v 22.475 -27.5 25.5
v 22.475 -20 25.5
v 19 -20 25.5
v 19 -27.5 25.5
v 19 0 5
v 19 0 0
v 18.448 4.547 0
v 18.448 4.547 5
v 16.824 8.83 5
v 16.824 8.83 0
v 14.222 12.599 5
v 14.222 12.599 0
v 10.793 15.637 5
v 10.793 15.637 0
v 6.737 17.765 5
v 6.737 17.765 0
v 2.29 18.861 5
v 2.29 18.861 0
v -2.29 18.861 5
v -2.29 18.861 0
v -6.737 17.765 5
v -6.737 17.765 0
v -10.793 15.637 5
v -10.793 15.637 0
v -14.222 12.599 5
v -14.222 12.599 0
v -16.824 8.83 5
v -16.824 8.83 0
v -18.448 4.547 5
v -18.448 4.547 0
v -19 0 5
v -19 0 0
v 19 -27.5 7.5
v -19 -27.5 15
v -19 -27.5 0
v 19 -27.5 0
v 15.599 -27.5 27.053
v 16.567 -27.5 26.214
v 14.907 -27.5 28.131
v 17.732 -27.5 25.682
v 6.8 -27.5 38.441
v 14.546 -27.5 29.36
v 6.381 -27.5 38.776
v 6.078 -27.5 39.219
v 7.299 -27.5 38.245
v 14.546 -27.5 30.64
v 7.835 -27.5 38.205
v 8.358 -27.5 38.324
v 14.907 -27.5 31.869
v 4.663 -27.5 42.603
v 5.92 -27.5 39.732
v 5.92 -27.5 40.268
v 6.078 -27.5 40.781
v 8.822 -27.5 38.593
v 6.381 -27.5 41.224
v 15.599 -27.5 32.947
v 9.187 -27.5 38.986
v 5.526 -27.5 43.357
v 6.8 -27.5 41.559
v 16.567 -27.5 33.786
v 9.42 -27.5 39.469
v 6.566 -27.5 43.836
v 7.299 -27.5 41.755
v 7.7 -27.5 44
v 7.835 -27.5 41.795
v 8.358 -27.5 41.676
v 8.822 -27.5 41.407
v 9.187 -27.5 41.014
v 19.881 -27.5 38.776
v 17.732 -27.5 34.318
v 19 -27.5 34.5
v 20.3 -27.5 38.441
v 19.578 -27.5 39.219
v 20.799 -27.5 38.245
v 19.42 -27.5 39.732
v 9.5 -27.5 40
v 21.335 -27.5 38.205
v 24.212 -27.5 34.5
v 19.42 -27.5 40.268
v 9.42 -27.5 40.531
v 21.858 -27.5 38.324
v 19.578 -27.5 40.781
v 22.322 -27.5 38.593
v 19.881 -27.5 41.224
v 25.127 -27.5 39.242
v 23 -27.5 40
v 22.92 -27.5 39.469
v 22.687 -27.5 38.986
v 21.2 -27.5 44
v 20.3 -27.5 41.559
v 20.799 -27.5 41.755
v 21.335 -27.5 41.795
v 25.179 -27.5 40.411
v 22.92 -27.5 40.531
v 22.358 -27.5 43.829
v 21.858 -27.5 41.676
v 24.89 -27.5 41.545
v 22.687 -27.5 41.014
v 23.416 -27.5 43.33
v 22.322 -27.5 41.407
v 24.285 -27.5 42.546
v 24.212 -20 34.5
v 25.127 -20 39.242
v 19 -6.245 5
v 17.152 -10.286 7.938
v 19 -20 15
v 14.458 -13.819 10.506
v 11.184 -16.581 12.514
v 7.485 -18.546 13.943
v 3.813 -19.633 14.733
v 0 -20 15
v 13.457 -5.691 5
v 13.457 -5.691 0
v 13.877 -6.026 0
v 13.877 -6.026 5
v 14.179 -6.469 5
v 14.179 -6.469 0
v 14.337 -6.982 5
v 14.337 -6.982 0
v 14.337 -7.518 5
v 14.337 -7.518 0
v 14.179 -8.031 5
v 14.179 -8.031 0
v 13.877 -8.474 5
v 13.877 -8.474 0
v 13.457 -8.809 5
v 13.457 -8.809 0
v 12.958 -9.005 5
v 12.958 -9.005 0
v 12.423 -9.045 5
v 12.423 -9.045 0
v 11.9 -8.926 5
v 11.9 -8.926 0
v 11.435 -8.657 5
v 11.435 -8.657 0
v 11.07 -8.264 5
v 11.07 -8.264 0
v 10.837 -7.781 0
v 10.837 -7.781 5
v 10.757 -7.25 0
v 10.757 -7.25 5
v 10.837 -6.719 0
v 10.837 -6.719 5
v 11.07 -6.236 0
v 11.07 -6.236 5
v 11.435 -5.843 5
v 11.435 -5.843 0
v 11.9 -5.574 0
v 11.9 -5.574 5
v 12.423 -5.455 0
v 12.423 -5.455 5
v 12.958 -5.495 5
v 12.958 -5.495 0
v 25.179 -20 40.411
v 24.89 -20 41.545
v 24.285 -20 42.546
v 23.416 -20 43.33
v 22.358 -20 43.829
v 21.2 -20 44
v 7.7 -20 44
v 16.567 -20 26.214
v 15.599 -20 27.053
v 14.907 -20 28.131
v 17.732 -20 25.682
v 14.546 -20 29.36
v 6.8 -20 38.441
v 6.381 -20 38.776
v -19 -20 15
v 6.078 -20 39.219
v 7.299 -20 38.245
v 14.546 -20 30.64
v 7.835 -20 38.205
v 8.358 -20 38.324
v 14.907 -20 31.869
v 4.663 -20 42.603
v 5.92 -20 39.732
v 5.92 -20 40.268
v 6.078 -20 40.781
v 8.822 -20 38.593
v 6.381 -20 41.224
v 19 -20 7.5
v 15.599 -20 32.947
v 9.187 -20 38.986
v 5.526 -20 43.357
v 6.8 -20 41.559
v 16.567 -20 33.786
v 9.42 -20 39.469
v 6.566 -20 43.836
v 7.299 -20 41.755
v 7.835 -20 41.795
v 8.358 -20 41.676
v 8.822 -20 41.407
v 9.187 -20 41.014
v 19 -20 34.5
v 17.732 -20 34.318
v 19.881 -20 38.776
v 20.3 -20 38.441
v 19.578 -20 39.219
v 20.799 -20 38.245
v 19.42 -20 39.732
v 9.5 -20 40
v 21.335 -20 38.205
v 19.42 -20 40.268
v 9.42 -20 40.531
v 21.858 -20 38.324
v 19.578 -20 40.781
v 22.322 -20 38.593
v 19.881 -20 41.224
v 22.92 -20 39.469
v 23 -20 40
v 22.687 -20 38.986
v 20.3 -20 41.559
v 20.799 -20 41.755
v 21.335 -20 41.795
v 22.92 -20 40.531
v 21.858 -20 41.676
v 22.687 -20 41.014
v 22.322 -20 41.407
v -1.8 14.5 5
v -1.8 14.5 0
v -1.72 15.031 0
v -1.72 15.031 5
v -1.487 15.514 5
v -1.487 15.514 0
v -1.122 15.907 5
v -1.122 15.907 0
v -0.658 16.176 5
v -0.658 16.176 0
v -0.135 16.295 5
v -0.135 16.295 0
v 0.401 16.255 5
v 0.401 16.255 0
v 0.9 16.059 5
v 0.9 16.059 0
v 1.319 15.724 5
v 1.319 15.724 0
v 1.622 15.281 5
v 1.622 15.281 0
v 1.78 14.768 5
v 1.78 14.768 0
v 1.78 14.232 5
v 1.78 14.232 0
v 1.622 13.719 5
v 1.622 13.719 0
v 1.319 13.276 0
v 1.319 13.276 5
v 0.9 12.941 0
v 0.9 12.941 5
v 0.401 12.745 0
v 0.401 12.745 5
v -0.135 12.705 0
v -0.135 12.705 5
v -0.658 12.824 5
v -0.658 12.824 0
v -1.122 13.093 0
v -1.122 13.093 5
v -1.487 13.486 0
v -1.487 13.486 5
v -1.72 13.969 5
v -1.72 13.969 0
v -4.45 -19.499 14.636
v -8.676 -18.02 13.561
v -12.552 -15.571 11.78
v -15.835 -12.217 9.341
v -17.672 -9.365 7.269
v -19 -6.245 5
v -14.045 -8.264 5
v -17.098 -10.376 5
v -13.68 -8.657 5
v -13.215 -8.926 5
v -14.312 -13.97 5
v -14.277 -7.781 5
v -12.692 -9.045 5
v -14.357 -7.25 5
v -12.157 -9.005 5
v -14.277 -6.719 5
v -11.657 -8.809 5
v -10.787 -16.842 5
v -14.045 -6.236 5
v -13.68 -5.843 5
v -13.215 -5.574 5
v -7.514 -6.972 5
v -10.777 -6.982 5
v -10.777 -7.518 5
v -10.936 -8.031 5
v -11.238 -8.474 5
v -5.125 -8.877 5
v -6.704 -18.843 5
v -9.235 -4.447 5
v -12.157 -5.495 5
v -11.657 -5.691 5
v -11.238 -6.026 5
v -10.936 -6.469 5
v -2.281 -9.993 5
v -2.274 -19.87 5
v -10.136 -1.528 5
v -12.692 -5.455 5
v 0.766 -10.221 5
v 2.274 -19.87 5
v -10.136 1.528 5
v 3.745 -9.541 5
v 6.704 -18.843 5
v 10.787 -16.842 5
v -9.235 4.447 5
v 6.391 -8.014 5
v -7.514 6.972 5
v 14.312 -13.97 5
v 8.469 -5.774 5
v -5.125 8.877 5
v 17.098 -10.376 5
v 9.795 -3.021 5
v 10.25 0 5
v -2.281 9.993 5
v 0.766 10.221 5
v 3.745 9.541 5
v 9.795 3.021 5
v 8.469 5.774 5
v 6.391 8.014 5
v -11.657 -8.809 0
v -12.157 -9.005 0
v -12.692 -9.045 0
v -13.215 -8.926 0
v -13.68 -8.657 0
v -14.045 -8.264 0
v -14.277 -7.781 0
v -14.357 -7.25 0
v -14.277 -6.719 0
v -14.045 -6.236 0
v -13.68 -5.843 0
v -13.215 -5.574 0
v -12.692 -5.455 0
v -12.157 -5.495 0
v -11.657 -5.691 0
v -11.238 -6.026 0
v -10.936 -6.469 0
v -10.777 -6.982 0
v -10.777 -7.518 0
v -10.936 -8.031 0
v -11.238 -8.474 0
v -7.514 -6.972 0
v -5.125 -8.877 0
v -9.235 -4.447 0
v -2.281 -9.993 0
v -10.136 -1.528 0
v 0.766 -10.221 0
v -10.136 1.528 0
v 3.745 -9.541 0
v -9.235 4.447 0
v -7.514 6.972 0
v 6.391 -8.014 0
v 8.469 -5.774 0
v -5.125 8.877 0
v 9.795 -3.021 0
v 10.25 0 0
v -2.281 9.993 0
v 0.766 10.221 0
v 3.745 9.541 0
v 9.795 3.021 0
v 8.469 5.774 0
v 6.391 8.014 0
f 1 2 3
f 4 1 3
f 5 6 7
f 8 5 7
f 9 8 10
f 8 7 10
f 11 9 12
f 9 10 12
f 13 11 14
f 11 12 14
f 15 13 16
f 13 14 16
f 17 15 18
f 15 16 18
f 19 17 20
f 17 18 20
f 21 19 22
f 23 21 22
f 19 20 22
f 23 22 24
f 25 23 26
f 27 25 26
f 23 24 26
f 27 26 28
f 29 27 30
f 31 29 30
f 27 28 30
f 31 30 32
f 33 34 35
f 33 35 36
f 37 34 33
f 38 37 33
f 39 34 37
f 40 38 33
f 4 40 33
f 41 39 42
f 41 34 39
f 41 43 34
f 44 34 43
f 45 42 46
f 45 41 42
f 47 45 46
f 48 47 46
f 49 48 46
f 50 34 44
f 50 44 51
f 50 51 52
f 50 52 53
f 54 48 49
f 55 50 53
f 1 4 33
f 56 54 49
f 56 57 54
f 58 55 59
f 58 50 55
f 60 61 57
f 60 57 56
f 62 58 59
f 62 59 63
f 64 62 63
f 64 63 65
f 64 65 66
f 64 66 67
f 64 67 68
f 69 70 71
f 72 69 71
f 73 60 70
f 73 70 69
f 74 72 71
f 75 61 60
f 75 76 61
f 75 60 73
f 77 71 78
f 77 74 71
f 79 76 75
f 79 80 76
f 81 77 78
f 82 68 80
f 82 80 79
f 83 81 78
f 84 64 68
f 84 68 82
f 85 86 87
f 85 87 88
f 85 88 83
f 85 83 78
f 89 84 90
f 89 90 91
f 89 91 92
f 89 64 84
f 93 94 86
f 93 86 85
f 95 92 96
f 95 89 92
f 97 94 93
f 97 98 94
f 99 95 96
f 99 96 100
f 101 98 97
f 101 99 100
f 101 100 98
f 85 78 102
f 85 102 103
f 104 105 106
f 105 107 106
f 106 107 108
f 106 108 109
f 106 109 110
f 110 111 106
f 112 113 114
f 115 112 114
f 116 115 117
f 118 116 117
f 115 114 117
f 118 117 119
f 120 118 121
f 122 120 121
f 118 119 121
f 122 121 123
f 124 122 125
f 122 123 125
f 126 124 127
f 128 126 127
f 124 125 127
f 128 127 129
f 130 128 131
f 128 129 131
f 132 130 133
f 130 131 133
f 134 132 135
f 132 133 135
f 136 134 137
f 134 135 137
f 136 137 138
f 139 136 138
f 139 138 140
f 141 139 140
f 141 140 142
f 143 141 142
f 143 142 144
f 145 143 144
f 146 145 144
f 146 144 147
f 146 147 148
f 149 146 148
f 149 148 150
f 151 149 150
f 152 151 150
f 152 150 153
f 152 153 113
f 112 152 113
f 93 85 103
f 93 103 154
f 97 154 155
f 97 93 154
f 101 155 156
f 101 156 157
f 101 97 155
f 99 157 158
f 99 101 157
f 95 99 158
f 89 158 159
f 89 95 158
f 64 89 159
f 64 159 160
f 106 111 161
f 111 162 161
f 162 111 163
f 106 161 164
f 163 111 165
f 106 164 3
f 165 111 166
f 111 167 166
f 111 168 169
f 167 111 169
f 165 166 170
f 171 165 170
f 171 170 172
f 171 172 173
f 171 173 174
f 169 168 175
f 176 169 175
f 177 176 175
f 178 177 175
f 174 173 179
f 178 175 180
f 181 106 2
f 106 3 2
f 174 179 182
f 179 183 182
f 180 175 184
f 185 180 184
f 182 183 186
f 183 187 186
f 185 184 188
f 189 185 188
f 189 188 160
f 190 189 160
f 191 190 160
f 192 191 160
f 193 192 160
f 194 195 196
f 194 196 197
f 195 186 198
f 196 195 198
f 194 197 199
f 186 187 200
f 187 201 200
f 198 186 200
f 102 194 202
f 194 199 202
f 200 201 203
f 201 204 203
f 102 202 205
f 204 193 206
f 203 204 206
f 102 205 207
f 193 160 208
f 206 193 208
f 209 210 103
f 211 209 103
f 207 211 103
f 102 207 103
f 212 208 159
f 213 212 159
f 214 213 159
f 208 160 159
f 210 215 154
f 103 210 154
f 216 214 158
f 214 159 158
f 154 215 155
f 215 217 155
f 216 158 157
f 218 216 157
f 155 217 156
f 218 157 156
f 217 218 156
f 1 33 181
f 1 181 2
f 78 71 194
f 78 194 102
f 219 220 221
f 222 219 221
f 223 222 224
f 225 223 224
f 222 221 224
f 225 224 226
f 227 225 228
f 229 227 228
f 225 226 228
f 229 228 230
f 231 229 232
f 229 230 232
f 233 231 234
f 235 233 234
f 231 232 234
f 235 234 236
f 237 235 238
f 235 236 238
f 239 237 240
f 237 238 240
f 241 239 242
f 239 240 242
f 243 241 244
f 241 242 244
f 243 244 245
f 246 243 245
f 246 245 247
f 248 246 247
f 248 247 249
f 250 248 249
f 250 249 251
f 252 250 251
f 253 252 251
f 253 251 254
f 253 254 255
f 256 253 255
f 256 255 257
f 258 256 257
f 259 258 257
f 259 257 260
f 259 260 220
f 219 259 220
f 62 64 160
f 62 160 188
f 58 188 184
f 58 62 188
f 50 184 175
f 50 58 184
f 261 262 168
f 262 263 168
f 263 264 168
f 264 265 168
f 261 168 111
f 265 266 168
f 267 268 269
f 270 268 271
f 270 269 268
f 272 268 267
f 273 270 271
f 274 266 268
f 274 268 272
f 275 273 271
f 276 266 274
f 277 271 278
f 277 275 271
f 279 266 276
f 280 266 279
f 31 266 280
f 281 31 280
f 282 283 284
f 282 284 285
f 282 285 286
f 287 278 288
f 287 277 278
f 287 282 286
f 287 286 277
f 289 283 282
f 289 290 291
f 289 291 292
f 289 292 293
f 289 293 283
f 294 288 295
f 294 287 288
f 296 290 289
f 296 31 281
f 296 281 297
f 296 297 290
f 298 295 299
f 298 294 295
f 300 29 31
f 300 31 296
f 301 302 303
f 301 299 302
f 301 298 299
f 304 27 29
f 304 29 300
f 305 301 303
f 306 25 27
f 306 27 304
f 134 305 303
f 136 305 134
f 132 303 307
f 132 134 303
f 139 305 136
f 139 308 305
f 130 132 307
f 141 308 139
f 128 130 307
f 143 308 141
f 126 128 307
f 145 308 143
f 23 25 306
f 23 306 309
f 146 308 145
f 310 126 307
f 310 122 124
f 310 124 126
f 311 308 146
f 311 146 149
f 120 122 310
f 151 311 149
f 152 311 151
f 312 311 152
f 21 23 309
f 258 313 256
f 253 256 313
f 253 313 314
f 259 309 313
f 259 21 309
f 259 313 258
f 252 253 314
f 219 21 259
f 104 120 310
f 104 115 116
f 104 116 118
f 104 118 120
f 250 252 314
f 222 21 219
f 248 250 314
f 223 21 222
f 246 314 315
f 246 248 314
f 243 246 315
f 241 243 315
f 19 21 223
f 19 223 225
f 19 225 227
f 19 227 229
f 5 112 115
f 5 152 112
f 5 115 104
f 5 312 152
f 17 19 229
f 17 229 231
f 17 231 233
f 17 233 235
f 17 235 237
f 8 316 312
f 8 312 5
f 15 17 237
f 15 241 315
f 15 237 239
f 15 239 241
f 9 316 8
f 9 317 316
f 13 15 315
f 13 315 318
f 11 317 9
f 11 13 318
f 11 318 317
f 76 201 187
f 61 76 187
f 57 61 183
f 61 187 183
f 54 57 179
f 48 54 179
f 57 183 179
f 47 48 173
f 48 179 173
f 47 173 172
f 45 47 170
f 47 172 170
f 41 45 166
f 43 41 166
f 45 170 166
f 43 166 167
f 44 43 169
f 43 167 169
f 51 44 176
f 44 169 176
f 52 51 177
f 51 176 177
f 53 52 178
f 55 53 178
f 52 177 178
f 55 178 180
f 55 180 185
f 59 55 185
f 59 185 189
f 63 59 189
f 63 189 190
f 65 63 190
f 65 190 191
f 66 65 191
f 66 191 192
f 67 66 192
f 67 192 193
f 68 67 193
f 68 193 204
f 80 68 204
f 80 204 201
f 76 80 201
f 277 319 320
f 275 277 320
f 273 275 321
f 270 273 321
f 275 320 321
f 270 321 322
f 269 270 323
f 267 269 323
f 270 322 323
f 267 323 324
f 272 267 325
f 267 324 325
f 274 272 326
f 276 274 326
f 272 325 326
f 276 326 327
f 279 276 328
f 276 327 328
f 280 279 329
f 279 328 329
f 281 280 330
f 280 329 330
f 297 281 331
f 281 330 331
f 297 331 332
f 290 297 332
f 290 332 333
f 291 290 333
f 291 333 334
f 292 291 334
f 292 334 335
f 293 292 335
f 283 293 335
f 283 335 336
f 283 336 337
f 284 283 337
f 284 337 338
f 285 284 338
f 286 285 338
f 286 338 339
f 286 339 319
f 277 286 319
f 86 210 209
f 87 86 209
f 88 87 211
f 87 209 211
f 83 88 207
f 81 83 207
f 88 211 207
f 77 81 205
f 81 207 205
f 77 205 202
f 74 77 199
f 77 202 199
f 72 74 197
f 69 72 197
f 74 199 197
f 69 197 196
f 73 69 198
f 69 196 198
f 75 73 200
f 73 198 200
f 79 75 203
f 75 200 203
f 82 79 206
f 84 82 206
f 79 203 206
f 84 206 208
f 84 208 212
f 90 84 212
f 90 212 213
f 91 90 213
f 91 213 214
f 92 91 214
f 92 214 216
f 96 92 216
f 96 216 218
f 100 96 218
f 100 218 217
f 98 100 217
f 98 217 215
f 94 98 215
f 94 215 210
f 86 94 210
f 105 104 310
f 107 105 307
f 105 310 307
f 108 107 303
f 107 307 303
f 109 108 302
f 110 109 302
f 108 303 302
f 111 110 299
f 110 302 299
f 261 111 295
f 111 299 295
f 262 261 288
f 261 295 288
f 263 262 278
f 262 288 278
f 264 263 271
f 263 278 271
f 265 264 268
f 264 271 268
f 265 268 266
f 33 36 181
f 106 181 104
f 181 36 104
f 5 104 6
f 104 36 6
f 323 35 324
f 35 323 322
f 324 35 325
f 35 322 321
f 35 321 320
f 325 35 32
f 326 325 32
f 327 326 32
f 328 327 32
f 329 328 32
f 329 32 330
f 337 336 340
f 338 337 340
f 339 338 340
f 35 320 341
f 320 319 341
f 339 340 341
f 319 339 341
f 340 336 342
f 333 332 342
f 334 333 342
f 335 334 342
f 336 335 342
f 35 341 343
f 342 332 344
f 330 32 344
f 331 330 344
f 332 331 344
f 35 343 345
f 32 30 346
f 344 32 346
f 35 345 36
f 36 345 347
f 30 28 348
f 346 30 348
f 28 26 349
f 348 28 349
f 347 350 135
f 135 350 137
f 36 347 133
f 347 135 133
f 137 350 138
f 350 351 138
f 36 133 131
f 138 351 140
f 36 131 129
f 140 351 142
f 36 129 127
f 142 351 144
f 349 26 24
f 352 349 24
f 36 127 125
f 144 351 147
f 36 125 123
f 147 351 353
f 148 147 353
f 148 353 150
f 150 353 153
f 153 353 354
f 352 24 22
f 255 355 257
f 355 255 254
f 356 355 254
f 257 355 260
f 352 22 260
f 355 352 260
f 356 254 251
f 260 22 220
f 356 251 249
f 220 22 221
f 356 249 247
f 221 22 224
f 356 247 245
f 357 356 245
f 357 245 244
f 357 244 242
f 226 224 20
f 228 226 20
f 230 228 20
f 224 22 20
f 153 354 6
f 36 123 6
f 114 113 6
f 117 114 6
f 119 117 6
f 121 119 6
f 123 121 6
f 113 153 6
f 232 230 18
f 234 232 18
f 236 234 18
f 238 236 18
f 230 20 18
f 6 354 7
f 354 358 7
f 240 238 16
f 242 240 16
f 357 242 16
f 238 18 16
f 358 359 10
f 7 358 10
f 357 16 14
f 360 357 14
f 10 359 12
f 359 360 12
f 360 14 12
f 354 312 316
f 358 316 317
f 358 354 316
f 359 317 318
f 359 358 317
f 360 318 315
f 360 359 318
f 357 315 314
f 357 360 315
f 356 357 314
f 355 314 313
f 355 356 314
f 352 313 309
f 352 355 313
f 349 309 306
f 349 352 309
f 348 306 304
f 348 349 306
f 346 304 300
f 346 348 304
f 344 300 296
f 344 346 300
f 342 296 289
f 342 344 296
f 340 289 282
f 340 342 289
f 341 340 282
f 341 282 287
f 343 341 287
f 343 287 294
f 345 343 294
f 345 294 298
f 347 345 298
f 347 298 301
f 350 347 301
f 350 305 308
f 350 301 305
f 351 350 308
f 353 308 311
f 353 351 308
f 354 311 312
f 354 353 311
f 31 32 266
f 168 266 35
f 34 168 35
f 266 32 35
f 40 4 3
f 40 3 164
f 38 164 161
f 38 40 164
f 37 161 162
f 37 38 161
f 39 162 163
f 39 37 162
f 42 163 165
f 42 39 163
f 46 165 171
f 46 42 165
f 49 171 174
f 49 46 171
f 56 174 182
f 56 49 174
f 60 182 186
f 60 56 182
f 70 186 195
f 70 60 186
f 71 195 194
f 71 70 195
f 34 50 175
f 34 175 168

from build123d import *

# Parameters (mm, degrees)
SKETCH1_R            = 10.25
BOSS_EXTRUDE1_DEPTH  = 5
M3_CLEARANCE_HOLE1_D = 3.6
CIRPATTERN1_COUNT    = 3
BOSS_EXTRUDE2_DEPTH  = 15
BOSS_EXTRUDE3_DEPTH  = 7.5
M3_CLEARANCE_HOLE2_D = 3.6
CUT_EXTRUDE1_DEPTH   = 45.2
CUT_EXTRUDE2_DEPTH   = 47.5


with BuildPart() as part:
    # Sketch1 → Boss-Extrude1 (new body)
    with BuildSketch(Plane.XY):
        with BuildLine():
            Line((19, -27.5), (19, 0))
            ThreePointArc((19, 0), (0, 19), (-19, 0))
            Line((-19, 0), (-19, -27.5))
            Line((-19, -27.5), (19, -27.5))
        make_face()
        Circle(SKETCH1_R, mode=Mode.SUBTRACT)
    extrude(amount=BOSS_EXTRUDE1_DEPTH)

    # M3 Clearance Hole1 (through all)
    with Locations(Plane.XY.offset(5)):
        with Locations((0, 14.5)):
            m3_clearance_hole1 = Hole(M3_CLEARANCE_HOLE1_D / 2)

    # CirPattern1: M3 Clearance Hole1 ×3 about axis
    cirpattern1_axis = Axis((0, 0, 0), (0, 0, 1))
    for i in range(1, CIRPATTERN1_COUNT):
        add(m3_clearance_hole1.rotate(cirpattern1_axis, i * 360 / CIRPATTERN1_COUNT), mode=Mode.SUBTRACT)

    # Sketch6 → Boss-Extrude2 (add)
    with BuildSketch(Plane.XY):
        with BuildLine():
            ThreePointArc((19, -6.244997998), (0, -20), (-19, -6.244997998))
            Line((-19, -6.244997998), (-19, -27.5))
            Line((-19, -27.5), (19, -27.5))
            Line((19, -27.5), (19, -6.244997998))
        make_face()
    extrude(amount=BOSS_EXTRUDE2_DEPTH)

    # Sketch7 → Boss-Extrude3 (add)
    with BuildSketch(Plane.XZ.offset(27.5)):
        with BuildLine():
            Line((19, 7.5), (25.127490345, 39.241831423))
            ThreePointArc((25.127490345, 39.241831423), (24.284856099, 42.546303761), (21.2, 44))
            Line((21.2, 44), (7.7, 44))
            ThreePointArc((7.7, 44), (6.028691054, 43.634105998), (4.663143067, 42.603363204))
            Line((4.663143067, 42.603363204), (-19, 15))
            Line((-19, 15), (19, 15))
            Line((19, 15), (19, 7.5))
        make_face()
    extrude(amount=-BOSS_EXTRUDE3_DEPTH)

    # M3 Clearance Hole2 (through all)
    with Locations(Plane(origin=(0, -27.5, 0), x_dir=(-1, 0, 0), z_dir=(0, -1, 0))):
        with Locations((-21.2, -40), (-7.7, -40)):
            Hole(M3_CLEARANCE_HOLE2_D / 2)

    # Sketch10 → Cut-Extrude1 (cut, through all)
    with BuildSketch(Plane.ZY.offset(19)):
        Polygon((5, -6.244997998), (15, -20), (15, -6.244997998), align=None)
    extrude(amount=-CUT_EXTRUDE1_DEPTH, mode=Mode.SUBTRACT)

    # Sketch11 → Cut-Extrude2 (cut, through all)
    with BuildSketch(Plane.XZ.offset(27.5)):
        with BuildLine():
            Line((19, 34.5), (24.212120155, 34.5))
            Line((24.212120155, 34.5), (22.47474677, 25.5))
            Line((22.47474677, 25.5), (19, 25.5))
            ThreePointArc((19, 25.5), (14.5, 30), (19, 34.5))
        make_face()
    extrude(amount=-CUT_EXTRUDE2_DEPTH, mode=Mode.SUBTRACT)


solid = part.part
